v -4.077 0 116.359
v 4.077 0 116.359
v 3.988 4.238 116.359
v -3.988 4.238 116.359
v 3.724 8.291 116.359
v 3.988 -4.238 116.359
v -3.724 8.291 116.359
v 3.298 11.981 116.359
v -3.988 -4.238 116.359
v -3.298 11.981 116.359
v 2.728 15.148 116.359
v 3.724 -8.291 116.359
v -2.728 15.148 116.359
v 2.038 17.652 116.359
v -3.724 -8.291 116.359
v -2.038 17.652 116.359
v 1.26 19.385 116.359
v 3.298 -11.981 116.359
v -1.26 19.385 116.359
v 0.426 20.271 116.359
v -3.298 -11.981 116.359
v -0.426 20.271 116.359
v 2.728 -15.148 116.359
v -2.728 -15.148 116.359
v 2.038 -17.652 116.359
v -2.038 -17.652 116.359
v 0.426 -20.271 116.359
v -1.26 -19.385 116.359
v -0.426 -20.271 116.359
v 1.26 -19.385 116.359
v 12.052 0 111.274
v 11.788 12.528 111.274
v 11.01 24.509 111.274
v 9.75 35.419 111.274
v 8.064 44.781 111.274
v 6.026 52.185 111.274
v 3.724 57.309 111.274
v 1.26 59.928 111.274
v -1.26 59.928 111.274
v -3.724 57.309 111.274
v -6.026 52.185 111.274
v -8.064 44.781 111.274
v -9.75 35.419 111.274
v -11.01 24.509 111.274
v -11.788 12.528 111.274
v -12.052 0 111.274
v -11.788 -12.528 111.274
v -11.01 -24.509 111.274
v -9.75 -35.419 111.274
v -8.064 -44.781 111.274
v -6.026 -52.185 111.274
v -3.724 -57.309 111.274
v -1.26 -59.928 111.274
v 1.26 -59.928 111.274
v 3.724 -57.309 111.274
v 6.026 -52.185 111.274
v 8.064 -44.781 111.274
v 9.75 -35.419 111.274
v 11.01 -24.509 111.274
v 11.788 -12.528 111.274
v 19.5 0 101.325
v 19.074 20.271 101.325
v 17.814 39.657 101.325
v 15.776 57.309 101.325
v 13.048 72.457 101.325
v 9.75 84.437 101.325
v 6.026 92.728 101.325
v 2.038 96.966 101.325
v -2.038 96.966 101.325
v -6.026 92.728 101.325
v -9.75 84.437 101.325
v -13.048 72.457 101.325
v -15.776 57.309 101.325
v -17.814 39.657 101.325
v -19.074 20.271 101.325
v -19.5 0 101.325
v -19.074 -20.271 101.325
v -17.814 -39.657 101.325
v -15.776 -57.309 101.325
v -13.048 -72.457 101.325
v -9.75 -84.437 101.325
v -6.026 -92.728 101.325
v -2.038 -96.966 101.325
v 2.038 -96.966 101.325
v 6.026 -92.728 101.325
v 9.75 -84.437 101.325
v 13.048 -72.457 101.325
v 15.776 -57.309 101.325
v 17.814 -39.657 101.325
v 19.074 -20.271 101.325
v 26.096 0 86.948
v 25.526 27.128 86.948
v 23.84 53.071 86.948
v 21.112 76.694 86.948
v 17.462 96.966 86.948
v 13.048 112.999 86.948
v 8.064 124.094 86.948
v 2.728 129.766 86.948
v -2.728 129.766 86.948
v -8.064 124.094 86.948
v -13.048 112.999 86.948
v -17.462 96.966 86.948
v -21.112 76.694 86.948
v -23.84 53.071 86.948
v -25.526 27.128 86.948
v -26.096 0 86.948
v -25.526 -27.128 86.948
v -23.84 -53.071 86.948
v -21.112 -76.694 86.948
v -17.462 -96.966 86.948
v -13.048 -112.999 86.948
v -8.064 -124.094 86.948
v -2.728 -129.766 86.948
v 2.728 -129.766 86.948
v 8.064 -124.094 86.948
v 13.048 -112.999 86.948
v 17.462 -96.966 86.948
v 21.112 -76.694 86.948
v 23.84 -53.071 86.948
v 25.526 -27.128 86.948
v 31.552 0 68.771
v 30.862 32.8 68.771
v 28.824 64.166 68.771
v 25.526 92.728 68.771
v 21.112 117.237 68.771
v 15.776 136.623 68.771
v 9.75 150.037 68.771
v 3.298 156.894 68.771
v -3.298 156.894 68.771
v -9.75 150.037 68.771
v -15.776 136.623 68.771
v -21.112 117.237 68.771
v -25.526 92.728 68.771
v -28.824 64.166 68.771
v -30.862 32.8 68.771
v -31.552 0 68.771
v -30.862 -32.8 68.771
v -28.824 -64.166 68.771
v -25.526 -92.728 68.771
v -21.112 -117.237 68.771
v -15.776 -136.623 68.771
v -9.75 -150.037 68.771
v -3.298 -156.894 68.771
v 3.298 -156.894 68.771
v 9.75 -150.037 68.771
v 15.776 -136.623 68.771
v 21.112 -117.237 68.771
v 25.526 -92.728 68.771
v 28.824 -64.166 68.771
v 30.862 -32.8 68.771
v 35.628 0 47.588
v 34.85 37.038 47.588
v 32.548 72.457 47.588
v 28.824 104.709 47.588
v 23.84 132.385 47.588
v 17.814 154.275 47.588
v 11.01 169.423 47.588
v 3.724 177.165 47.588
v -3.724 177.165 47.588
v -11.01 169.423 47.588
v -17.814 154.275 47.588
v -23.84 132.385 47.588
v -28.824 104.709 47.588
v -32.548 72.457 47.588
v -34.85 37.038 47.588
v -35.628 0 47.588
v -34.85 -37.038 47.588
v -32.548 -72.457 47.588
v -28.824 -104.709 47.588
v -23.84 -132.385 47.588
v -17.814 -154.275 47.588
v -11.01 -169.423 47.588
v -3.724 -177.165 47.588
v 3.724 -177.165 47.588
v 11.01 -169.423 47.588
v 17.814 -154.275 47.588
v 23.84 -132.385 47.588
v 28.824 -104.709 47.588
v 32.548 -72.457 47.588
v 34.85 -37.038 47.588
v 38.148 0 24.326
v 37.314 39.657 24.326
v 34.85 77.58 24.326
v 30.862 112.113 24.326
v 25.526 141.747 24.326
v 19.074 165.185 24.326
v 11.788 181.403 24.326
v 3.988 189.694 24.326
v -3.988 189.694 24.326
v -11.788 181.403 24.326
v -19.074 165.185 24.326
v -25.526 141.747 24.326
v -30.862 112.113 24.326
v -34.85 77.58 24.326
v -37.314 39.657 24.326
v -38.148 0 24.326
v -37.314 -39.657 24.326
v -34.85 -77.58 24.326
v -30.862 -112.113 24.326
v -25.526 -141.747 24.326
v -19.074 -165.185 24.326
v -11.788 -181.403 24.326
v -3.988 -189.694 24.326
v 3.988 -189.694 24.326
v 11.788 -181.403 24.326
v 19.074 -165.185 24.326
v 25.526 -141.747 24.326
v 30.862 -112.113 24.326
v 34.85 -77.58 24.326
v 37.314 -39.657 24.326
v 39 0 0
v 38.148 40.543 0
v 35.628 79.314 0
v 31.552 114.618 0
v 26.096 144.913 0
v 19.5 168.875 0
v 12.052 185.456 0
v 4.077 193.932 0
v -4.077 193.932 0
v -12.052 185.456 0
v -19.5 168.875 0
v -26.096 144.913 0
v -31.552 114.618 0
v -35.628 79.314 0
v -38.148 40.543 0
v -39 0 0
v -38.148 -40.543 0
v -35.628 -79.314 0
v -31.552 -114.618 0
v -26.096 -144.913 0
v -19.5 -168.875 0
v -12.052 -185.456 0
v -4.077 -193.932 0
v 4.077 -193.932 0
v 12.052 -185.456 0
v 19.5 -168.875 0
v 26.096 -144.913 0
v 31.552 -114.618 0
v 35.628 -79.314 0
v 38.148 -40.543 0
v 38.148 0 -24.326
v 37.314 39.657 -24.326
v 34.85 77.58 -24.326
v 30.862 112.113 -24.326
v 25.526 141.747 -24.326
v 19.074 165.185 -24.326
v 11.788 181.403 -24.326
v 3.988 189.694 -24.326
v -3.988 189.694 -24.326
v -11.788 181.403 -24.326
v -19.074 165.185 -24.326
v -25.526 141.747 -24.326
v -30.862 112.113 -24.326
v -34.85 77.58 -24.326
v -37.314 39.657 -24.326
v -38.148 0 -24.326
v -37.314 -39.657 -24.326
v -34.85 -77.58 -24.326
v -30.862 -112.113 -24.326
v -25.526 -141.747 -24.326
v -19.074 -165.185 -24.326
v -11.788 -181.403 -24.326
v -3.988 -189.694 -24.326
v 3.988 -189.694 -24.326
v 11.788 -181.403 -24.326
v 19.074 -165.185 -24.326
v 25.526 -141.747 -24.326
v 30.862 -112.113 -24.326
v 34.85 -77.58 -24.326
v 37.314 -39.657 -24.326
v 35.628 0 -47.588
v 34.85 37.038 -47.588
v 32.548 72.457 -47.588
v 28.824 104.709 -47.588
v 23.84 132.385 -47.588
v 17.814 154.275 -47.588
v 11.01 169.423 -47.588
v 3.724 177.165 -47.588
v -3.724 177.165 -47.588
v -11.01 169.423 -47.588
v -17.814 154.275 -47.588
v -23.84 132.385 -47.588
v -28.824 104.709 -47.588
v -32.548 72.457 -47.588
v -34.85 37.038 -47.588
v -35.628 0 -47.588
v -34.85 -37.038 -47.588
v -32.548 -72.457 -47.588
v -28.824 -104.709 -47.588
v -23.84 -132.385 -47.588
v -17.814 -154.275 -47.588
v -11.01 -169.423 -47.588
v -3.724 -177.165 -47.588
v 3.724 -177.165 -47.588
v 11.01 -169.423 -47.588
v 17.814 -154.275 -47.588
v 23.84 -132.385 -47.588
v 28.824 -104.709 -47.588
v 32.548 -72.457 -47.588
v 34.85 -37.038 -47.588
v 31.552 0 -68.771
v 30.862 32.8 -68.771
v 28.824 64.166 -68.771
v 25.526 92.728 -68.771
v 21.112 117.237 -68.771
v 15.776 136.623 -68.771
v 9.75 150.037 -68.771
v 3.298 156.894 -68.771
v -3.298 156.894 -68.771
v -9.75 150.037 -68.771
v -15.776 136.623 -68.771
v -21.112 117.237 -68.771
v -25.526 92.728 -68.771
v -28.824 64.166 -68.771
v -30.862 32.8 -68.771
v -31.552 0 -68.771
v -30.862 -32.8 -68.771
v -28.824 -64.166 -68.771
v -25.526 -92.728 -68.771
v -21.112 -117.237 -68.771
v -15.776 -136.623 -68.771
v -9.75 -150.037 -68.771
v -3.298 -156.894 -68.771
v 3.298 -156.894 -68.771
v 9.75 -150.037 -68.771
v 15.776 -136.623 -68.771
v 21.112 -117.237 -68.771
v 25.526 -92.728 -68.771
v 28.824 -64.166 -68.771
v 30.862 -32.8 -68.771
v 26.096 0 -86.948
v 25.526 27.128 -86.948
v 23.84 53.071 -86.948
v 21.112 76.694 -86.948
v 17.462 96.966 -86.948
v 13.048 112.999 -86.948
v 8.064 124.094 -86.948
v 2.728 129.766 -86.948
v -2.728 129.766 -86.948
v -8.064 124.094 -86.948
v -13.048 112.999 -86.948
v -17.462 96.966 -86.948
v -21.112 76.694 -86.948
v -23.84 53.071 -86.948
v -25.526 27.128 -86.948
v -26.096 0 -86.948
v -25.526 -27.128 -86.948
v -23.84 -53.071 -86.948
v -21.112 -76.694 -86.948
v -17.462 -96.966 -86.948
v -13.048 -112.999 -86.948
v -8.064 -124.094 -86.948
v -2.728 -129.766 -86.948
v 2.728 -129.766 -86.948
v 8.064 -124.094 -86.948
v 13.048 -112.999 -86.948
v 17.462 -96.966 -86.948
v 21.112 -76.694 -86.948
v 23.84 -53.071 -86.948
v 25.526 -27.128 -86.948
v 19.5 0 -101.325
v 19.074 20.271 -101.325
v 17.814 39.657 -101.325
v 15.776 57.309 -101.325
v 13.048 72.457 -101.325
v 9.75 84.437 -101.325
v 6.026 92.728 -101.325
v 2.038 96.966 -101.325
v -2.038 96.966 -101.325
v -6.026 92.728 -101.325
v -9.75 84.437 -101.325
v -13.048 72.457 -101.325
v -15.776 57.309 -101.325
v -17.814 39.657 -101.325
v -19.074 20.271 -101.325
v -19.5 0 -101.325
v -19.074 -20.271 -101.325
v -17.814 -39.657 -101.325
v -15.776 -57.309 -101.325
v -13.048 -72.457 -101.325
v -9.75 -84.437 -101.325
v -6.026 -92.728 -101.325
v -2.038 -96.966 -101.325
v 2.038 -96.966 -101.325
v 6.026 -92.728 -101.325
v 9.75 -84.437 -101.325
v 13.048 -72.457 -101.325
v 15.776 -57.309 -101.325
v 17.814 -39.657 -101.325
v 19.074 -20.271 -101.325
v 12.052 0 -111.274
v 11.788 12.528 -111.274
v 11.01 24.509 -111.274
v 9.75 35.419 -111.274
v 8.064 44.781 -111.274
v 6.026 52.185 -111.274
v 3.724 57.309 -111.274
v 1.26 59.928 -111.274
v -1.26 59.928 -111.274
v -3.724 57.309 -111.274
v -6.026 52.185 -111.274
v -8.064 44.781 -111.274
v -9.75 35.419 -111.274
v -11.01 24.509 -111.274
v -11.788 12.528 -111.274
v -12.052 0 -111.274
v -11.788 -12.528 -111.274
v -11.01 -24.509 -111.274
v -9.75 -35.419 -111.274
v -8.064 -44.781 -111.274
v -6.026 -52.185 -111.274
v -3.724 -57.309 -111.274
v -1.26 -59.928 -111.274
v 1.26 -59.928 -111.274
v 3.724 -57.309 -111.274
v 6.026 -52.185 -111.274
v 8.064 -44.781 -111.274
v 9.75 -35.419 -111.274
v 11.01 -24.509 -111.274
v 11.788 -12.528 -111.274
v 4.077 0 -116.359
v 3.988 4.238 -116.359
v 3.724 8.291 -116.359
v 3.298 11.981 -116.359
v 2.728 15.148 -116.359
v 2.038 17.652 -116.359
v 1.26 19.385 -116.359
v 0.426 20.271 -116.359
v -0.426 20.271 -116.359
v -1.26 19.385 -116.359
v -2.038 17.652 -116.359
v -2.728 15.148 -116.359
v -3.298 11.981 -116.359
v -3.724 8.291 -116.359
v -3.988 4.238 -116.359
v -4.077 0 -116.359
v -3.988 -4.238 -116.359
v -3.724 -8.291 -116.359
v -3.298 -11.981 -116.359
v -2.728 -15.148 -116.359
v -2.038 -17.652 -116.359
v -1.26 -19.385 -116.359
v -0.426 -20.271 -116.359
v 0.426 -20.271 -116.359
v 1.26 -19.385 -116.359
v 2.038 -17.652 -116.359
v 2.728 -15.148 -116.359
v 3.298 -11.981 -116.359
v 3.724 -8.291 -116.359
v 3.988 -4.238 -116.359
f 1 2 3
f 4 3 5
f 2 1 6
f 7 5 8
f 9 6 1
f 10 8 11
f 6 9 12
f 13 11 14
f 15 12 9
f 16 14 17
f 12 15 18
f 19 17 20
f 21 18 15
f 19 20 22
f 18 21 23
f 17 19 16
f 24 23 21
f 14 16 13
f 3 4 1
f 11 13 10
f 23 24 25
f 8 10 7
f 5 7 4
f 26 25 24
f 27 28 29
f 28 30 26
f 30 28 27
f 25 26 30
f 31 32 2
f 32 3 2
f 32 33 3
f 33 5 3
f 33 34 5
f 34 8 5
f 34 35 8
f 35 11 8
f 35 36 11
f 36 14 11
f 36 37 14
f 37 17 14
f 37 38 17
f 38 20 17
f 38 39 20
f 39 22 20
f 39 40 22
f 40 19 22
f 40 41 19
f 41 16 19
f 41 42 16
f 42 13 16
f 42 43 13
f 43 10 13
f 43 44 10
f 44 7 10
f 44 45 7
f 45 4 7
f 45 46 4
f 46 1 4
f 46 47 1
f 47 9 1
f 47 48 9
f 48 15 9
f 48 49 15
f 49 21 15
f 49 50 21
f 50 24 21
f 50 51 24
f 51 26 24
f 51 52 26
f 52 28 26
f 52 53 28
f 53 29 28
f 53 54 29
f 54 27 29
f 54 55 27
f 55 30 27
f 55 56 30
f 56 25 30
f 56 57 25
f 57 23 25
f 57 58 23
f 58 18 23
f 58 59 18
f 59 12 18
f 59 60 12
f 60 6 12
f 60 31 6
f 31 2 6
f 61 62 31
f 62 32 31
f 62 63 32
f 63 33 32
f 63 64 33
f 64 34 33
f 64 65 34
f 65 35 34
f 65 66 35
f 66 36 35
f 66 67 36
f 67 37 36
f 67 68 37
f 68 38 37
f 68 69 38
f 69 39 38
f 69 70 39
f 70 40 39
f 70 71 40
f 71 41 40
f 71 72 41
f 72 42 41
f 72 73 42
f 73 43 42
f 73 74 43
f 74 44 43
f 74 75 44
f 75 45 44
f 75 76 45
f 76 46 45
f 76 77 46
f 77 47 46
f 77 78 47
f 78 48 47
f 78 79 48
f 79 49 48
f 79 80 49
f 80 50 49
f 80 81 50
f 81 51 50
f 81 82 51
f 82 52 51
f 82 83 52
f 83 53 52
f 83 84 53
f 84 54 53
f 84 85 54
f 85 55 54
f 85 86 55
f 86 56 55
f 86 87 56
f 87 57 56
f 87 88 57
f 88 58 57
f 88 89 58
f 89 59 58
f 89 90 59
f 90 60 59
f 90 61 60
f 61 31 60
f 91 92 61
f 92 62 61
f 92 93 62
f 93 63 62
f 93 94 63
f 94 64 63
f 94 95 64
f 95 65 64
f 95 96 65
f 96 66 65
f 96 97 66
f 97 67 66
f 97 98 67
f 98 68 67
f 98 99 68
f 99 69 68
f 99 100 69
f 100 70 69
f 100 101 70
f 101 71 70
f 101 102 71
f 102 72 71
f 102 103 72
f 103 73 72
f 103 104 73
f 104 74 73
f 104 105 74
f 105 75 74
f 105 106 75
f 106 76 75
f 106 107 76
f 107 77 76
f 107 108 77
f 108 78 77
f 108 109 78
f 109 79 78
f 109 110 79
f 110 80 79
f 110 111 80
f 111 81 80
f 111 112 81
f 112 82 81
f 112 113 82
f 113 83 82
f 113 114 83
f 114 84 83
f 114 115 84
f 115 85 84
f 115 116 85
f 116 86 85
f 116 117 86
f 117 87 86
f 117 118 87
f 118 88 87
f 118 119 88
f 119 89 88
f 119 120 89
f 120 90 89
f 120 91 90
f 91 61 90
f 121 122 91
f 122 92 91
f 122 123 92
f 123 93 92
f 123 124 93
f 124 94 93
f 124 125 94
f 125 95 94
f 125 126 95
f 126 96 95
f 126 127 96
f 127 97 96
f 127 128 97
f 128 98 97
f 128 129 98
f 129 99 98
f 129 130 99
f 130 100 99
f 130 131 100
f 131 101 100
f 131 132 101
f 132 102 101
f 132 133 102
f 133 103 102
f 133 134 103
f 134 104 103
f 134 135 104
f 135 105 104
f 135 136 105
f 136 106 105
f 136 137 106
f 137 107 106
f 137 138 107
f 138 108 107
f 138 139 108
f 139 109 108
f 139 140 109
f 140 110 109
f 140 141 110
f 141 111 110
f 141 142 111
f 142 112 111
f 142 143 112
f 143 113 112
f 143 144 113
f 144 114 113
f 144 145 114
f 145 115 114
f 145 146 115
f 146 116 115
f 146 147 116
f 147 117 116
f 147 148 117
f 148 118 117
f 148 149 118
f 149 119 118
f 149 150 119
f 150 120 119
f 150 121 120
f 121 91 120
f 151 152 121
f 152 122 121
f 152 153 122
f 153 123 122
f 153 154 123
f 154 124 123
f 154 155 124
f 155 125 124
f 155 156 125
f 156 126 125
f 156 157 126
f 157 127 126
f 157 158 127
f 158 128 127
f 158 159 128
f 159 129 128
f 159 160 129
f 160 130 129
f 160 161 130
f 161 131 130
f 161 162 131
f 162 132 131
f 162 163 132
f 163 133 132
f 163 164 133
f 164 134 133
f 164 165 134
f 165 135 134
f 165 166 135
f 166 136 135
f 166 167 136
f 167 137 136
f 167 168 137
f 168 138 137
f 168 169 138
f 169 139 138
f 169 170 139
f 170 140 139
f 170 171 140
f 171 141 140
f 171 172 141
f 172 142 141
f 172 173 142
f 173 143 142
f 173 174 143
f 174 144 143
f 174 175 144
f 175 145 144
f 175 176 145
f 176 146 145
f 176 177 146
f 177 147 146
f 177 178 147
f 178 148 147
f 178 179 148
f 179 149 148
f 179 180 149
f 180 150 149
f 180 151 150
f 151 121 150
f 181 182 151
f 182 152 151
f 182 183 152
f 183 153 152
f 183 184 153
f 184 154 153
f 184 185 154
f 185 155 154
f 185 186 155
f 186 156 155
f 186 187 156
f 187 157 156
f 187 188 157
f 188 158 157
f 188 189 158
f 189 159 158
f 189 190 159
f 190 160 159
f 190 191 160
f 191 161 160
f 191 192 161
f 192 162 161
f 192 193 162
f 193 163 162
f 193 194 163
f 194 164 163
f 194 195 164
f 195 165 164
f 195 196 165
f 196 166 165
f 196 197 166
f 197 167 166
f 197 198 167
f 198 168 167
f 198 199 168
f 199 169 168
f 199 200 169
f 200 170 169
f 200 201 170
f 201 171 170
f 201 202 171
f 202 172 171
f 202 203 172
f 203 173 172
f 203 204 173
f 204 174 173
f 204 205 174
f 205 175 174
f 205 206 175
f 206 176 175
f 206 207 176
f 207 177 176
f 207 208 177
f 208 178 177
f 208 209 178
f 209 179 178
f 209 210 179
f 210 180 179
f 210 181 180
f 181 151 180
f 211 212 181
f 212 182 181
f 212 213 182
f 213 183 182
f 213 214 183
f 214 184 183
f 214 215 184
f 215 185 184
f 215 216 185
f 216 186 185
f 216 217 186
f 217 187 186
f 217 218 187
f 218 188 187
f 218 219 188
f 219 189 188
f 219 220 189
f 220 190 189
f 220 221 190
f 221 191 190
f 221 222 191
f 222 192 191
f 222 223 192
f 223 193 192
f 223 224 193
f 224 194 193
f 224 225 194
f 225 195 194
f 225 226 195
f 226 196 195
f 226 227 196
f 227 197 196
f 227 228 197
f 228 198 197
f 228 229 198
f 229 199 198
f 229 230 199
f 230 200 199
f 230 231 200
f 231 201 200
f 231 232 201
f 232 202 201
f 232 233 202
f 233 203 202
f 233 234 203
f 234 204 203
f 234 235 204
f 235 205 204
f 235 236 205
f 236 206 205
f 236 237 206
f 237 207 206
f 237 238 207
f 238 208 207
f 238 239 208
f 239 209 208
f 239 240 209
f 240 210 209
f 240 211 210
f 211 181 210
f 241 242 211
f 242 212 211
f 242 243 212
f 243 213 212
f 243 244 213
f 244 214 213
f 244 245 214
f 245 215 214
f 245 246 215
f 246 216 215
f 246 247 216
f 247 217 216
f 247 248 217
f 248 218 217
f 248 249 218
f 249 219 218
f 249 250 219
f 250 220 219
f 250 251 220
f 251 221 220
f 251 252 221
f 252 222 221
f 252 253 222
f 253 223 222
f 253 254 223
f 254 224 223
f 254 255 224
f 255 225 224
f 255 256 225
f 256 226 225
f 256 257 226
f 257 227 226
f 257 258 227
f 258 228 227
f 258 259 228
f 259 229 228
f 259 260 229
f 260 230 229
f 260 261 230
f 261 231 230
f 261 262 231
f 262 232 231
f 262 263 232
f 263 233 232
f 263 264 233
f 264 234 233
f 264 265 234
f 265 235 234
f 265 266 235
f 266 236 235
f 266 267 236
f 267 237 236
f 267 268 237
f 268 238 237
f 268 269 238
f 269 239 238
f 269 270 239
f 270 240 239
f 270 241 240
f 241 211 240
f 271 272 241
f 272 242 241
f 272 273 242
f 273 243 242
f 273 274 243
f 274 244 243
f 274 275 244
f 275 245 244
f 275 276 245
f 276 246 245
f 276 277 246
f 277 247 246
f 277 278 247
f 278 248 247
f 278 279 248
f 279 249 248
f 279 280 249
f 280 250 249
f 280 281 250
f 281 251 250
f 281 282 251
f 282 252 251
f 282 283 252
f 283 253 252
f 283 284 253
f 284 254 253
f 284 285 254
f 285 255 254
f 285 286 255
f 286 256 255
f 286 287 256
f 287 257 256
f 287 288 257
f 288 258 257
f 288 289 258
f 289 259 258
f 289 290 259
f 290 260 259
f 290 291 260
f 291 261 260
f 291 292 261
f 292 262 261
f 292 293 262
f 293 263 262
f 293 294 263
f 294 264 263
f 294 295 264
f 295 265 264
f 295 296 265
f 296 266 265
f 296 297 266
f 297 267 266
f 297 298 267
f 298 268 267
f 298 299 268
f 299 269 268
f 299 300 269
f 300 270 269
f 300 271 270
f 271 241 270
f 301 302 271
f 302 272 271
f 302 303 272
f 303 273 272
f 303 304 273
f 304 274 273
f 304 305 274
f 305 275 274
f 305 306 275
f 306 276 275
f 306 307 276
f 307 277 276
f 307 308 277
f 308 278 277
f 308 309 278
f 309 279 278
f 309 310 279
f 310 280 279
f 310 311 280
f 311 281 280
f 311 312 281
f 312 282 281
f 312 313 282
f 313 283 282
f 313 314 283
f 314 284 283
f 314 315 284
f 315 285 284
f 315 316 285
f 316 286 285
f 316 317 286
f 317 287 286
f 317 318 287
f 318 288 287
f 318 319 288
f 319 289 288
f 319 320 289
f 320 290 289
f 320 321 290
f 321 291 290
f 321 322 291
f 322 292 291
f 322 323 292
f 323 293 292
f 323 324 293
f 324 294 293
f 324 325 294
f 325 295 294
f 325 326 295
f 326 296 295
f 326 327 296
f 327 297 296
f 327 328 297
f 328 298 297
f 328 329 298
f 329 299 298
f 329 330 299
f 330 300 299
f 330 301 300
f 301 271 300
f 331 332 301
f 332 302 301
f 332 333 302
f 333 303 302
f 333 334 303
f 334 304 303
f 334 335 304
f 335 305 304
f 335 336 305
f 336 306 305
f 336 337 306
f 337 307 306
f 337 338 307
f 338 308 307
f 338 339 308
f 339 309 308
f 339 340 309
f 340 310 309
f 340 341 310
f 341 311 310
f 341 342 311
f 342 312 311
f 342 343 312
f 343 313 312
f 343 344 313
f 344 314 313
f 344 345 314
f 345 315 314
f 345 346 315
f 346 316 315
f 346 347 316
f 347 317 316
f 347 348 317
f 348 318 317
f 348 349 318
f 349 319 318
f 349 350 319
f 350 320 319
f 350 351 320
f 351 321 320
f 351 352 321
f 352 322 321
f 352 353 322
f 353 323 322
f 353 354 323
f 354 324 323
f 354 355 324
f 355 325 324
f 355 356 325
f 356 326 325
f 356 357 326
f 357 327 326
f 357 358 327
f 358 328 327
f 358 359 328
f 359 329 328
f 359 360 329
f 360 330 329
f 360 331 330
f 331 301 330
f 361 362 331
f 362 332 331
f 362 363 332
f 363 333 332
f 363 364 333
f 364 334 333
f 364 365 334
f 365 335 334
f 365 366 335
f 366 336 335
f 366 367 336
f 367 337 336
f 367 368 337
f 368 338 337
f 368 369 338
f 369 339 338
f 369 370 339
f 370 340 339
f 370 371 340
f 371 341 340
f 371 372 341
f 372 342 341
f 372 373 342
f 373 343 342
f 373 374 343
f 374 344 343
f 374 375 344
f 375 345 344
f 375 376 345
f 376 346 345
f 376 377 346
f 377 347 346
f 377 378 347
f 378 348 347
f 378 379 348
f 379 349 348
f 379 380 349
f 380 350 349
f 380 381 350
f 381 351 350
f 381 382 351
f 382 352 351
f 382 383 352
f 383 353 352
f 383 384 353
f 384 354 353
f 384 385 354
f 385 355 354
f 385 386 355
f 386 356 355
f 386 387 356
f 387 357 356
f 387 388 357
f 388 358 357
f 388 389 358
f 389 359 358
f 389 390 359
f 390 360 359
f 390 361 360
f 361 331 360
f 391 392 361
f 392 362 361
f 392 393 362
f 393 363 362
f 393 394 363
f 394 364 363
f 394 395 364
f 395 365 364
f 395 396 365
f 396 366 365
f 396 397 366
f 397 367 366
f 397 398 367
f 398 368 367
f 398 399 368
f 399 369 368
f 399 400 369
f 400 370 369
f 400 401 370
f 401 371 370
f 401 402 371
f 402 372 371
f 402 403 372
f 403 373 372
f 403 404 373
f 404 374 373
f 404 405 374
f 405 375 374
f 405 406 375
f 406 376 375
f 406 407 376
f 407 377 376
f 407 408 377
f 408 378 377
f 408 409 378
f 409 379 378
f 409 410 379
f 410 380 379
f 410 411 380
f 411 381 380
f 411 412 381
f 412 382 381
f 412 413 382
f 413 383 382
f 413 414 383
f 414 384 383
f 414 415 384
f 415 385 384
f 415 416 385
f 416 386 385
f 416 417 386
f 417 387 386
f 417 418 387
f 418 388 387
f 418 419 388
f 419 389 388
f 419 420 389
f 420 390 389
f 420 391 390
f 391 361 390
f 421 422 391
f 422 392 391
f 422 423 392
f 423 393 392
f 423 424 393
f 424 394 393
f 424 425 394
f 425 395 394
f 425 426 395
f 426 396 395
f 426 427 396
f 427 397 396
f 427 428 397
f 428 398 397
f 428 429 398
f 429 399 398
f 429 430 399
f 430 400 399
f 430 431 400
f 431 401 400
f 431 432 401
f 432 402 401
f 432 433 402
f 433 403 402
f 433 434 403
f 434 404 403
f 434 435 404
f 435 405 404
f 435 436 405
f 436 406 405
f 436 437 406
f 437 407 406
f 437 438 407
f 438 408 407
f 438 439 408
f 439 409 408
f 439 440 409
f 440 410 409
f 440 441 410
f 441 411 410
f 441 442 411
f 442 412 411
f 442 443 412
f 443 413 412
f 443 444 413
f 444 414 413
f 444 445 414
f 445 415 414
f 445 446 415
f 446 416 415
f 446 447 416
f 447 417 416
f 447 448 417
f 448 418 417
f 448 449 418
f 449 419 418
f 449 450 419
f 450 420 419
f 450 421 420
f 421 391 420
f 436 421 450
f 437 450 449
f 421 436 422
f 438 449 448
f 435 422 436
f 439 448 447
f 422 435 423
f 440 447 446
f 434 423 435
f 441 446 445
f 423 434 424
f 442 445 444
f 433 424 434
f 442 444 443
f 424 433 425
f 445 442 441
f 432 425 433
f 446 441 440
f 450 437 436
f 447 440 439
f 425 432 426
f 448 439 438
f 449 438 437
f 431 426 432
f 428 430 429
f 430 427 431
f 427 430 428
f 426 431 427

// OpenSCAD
// Generated by SolidPython 1.0.1 on 2020-07-29 00:46:45


scale(v = [3, 15, 9]) {
	sphere(r = 13);
}
/***********************************************
*********      SolidPython code:      **********
************************************************
 
# import packages: SolidPython
from solid import *
from solid.utils import *
from itertools import chain, combinations, permutations


class Resize:

    def __init__(self, scad_file):
        self.scad_file = scad_file
        #self.scad_file = import_scad(scad_file)
        # cone/cylinder param:
        self.r1 = 0
        self.r2 = 0
        self.h = 0
        # rectangular prism param:
        self.w = 0
        self.l = 0
        # ellipse param:
        self.r = 0

    # import OpenScad code (file name corresponds to shape)


    # classify shape + parameters
    def assign(self, param1, param2, param3):
        if self.scad_file == 'cone.scad':
            self.r1 = param1
            self.r2 = param2
            self.h = param3
        elif self.scad_file == 'cylinder.scad':
            self.r1 = param1
            self.r2 = param2
            self.h = param3
        elif self.scad_file == 'rectangularPrism.scad':
            self.h = param1
            self.l = param2
            self.w = param3
        else:
            self.r = param1
            self.h = param2

    # resize parameters
    def iterate(self):
        x = range(3, 20, 2)
        i = 1
        if self.scad_file == 'cone.scad':
            tempList = list(permutations(x, 2))
            for temp in tempList:
                param1 = temp[0]
                param2 = temp[1]
                filepath = 'produced_scad_files/' + 'cone' + str(param1) + '_' + str(param2) + '_' + '.scad'
                scad_render_to_file(cylinder(h=param1, r1=param2, r2=0), filepath)

        elif self.scad_file == 'cylinder.scad':
            tempList = list(permutations(x, 3))
            for temp in tempList:
                param1 = temp[0]
                param2 = temp[1]
                filepath = 'produced_scad_files/' + 'cylinder' + str(param1) + '_' + str(param2) + '_' + '.scad'
                scad_render_to_file(cylinder(h=param1, r1=param2, r2=param2), filepath)

        elif self.scad_file == 'rectangularPrism.scad':
            tempList = list(permutations(x, 3))
            for temp in tempList:
                param1 = temp[0]
                param2 = temp[1]
                param3 = temp[2]
                filepath = 'produced_scad_files/' + 'rectangularPrism' + str(param1) + '_' + str(param2) + '_' + str(
                    param3) + '.scad'
                scad_render_to_file(cube(size=(param1, param2, param3)), filepath)

        elif self.scad_file == 'ellipse.scad':
            tempList = list(permutations(x, 4))
            for temp in tempList:
                param1 = temp[0]
                param2 = temp[1]
                param3 = temp[2]
                param4 = temp[3]
                filepath = 'produced_scad_files/' + 'ellipse' + str(param1) + '_' + str(param2) + '_' + str(param3) + '_' + str(param4) + '.scad'
                scad_render_to_file(scale([param1, param2, param3])(sphere(r=param4)), filepath)

    def render_to_scadfile(self):
        scad_render_to_file(scad, 'example.scad') 
 
************************************************/
